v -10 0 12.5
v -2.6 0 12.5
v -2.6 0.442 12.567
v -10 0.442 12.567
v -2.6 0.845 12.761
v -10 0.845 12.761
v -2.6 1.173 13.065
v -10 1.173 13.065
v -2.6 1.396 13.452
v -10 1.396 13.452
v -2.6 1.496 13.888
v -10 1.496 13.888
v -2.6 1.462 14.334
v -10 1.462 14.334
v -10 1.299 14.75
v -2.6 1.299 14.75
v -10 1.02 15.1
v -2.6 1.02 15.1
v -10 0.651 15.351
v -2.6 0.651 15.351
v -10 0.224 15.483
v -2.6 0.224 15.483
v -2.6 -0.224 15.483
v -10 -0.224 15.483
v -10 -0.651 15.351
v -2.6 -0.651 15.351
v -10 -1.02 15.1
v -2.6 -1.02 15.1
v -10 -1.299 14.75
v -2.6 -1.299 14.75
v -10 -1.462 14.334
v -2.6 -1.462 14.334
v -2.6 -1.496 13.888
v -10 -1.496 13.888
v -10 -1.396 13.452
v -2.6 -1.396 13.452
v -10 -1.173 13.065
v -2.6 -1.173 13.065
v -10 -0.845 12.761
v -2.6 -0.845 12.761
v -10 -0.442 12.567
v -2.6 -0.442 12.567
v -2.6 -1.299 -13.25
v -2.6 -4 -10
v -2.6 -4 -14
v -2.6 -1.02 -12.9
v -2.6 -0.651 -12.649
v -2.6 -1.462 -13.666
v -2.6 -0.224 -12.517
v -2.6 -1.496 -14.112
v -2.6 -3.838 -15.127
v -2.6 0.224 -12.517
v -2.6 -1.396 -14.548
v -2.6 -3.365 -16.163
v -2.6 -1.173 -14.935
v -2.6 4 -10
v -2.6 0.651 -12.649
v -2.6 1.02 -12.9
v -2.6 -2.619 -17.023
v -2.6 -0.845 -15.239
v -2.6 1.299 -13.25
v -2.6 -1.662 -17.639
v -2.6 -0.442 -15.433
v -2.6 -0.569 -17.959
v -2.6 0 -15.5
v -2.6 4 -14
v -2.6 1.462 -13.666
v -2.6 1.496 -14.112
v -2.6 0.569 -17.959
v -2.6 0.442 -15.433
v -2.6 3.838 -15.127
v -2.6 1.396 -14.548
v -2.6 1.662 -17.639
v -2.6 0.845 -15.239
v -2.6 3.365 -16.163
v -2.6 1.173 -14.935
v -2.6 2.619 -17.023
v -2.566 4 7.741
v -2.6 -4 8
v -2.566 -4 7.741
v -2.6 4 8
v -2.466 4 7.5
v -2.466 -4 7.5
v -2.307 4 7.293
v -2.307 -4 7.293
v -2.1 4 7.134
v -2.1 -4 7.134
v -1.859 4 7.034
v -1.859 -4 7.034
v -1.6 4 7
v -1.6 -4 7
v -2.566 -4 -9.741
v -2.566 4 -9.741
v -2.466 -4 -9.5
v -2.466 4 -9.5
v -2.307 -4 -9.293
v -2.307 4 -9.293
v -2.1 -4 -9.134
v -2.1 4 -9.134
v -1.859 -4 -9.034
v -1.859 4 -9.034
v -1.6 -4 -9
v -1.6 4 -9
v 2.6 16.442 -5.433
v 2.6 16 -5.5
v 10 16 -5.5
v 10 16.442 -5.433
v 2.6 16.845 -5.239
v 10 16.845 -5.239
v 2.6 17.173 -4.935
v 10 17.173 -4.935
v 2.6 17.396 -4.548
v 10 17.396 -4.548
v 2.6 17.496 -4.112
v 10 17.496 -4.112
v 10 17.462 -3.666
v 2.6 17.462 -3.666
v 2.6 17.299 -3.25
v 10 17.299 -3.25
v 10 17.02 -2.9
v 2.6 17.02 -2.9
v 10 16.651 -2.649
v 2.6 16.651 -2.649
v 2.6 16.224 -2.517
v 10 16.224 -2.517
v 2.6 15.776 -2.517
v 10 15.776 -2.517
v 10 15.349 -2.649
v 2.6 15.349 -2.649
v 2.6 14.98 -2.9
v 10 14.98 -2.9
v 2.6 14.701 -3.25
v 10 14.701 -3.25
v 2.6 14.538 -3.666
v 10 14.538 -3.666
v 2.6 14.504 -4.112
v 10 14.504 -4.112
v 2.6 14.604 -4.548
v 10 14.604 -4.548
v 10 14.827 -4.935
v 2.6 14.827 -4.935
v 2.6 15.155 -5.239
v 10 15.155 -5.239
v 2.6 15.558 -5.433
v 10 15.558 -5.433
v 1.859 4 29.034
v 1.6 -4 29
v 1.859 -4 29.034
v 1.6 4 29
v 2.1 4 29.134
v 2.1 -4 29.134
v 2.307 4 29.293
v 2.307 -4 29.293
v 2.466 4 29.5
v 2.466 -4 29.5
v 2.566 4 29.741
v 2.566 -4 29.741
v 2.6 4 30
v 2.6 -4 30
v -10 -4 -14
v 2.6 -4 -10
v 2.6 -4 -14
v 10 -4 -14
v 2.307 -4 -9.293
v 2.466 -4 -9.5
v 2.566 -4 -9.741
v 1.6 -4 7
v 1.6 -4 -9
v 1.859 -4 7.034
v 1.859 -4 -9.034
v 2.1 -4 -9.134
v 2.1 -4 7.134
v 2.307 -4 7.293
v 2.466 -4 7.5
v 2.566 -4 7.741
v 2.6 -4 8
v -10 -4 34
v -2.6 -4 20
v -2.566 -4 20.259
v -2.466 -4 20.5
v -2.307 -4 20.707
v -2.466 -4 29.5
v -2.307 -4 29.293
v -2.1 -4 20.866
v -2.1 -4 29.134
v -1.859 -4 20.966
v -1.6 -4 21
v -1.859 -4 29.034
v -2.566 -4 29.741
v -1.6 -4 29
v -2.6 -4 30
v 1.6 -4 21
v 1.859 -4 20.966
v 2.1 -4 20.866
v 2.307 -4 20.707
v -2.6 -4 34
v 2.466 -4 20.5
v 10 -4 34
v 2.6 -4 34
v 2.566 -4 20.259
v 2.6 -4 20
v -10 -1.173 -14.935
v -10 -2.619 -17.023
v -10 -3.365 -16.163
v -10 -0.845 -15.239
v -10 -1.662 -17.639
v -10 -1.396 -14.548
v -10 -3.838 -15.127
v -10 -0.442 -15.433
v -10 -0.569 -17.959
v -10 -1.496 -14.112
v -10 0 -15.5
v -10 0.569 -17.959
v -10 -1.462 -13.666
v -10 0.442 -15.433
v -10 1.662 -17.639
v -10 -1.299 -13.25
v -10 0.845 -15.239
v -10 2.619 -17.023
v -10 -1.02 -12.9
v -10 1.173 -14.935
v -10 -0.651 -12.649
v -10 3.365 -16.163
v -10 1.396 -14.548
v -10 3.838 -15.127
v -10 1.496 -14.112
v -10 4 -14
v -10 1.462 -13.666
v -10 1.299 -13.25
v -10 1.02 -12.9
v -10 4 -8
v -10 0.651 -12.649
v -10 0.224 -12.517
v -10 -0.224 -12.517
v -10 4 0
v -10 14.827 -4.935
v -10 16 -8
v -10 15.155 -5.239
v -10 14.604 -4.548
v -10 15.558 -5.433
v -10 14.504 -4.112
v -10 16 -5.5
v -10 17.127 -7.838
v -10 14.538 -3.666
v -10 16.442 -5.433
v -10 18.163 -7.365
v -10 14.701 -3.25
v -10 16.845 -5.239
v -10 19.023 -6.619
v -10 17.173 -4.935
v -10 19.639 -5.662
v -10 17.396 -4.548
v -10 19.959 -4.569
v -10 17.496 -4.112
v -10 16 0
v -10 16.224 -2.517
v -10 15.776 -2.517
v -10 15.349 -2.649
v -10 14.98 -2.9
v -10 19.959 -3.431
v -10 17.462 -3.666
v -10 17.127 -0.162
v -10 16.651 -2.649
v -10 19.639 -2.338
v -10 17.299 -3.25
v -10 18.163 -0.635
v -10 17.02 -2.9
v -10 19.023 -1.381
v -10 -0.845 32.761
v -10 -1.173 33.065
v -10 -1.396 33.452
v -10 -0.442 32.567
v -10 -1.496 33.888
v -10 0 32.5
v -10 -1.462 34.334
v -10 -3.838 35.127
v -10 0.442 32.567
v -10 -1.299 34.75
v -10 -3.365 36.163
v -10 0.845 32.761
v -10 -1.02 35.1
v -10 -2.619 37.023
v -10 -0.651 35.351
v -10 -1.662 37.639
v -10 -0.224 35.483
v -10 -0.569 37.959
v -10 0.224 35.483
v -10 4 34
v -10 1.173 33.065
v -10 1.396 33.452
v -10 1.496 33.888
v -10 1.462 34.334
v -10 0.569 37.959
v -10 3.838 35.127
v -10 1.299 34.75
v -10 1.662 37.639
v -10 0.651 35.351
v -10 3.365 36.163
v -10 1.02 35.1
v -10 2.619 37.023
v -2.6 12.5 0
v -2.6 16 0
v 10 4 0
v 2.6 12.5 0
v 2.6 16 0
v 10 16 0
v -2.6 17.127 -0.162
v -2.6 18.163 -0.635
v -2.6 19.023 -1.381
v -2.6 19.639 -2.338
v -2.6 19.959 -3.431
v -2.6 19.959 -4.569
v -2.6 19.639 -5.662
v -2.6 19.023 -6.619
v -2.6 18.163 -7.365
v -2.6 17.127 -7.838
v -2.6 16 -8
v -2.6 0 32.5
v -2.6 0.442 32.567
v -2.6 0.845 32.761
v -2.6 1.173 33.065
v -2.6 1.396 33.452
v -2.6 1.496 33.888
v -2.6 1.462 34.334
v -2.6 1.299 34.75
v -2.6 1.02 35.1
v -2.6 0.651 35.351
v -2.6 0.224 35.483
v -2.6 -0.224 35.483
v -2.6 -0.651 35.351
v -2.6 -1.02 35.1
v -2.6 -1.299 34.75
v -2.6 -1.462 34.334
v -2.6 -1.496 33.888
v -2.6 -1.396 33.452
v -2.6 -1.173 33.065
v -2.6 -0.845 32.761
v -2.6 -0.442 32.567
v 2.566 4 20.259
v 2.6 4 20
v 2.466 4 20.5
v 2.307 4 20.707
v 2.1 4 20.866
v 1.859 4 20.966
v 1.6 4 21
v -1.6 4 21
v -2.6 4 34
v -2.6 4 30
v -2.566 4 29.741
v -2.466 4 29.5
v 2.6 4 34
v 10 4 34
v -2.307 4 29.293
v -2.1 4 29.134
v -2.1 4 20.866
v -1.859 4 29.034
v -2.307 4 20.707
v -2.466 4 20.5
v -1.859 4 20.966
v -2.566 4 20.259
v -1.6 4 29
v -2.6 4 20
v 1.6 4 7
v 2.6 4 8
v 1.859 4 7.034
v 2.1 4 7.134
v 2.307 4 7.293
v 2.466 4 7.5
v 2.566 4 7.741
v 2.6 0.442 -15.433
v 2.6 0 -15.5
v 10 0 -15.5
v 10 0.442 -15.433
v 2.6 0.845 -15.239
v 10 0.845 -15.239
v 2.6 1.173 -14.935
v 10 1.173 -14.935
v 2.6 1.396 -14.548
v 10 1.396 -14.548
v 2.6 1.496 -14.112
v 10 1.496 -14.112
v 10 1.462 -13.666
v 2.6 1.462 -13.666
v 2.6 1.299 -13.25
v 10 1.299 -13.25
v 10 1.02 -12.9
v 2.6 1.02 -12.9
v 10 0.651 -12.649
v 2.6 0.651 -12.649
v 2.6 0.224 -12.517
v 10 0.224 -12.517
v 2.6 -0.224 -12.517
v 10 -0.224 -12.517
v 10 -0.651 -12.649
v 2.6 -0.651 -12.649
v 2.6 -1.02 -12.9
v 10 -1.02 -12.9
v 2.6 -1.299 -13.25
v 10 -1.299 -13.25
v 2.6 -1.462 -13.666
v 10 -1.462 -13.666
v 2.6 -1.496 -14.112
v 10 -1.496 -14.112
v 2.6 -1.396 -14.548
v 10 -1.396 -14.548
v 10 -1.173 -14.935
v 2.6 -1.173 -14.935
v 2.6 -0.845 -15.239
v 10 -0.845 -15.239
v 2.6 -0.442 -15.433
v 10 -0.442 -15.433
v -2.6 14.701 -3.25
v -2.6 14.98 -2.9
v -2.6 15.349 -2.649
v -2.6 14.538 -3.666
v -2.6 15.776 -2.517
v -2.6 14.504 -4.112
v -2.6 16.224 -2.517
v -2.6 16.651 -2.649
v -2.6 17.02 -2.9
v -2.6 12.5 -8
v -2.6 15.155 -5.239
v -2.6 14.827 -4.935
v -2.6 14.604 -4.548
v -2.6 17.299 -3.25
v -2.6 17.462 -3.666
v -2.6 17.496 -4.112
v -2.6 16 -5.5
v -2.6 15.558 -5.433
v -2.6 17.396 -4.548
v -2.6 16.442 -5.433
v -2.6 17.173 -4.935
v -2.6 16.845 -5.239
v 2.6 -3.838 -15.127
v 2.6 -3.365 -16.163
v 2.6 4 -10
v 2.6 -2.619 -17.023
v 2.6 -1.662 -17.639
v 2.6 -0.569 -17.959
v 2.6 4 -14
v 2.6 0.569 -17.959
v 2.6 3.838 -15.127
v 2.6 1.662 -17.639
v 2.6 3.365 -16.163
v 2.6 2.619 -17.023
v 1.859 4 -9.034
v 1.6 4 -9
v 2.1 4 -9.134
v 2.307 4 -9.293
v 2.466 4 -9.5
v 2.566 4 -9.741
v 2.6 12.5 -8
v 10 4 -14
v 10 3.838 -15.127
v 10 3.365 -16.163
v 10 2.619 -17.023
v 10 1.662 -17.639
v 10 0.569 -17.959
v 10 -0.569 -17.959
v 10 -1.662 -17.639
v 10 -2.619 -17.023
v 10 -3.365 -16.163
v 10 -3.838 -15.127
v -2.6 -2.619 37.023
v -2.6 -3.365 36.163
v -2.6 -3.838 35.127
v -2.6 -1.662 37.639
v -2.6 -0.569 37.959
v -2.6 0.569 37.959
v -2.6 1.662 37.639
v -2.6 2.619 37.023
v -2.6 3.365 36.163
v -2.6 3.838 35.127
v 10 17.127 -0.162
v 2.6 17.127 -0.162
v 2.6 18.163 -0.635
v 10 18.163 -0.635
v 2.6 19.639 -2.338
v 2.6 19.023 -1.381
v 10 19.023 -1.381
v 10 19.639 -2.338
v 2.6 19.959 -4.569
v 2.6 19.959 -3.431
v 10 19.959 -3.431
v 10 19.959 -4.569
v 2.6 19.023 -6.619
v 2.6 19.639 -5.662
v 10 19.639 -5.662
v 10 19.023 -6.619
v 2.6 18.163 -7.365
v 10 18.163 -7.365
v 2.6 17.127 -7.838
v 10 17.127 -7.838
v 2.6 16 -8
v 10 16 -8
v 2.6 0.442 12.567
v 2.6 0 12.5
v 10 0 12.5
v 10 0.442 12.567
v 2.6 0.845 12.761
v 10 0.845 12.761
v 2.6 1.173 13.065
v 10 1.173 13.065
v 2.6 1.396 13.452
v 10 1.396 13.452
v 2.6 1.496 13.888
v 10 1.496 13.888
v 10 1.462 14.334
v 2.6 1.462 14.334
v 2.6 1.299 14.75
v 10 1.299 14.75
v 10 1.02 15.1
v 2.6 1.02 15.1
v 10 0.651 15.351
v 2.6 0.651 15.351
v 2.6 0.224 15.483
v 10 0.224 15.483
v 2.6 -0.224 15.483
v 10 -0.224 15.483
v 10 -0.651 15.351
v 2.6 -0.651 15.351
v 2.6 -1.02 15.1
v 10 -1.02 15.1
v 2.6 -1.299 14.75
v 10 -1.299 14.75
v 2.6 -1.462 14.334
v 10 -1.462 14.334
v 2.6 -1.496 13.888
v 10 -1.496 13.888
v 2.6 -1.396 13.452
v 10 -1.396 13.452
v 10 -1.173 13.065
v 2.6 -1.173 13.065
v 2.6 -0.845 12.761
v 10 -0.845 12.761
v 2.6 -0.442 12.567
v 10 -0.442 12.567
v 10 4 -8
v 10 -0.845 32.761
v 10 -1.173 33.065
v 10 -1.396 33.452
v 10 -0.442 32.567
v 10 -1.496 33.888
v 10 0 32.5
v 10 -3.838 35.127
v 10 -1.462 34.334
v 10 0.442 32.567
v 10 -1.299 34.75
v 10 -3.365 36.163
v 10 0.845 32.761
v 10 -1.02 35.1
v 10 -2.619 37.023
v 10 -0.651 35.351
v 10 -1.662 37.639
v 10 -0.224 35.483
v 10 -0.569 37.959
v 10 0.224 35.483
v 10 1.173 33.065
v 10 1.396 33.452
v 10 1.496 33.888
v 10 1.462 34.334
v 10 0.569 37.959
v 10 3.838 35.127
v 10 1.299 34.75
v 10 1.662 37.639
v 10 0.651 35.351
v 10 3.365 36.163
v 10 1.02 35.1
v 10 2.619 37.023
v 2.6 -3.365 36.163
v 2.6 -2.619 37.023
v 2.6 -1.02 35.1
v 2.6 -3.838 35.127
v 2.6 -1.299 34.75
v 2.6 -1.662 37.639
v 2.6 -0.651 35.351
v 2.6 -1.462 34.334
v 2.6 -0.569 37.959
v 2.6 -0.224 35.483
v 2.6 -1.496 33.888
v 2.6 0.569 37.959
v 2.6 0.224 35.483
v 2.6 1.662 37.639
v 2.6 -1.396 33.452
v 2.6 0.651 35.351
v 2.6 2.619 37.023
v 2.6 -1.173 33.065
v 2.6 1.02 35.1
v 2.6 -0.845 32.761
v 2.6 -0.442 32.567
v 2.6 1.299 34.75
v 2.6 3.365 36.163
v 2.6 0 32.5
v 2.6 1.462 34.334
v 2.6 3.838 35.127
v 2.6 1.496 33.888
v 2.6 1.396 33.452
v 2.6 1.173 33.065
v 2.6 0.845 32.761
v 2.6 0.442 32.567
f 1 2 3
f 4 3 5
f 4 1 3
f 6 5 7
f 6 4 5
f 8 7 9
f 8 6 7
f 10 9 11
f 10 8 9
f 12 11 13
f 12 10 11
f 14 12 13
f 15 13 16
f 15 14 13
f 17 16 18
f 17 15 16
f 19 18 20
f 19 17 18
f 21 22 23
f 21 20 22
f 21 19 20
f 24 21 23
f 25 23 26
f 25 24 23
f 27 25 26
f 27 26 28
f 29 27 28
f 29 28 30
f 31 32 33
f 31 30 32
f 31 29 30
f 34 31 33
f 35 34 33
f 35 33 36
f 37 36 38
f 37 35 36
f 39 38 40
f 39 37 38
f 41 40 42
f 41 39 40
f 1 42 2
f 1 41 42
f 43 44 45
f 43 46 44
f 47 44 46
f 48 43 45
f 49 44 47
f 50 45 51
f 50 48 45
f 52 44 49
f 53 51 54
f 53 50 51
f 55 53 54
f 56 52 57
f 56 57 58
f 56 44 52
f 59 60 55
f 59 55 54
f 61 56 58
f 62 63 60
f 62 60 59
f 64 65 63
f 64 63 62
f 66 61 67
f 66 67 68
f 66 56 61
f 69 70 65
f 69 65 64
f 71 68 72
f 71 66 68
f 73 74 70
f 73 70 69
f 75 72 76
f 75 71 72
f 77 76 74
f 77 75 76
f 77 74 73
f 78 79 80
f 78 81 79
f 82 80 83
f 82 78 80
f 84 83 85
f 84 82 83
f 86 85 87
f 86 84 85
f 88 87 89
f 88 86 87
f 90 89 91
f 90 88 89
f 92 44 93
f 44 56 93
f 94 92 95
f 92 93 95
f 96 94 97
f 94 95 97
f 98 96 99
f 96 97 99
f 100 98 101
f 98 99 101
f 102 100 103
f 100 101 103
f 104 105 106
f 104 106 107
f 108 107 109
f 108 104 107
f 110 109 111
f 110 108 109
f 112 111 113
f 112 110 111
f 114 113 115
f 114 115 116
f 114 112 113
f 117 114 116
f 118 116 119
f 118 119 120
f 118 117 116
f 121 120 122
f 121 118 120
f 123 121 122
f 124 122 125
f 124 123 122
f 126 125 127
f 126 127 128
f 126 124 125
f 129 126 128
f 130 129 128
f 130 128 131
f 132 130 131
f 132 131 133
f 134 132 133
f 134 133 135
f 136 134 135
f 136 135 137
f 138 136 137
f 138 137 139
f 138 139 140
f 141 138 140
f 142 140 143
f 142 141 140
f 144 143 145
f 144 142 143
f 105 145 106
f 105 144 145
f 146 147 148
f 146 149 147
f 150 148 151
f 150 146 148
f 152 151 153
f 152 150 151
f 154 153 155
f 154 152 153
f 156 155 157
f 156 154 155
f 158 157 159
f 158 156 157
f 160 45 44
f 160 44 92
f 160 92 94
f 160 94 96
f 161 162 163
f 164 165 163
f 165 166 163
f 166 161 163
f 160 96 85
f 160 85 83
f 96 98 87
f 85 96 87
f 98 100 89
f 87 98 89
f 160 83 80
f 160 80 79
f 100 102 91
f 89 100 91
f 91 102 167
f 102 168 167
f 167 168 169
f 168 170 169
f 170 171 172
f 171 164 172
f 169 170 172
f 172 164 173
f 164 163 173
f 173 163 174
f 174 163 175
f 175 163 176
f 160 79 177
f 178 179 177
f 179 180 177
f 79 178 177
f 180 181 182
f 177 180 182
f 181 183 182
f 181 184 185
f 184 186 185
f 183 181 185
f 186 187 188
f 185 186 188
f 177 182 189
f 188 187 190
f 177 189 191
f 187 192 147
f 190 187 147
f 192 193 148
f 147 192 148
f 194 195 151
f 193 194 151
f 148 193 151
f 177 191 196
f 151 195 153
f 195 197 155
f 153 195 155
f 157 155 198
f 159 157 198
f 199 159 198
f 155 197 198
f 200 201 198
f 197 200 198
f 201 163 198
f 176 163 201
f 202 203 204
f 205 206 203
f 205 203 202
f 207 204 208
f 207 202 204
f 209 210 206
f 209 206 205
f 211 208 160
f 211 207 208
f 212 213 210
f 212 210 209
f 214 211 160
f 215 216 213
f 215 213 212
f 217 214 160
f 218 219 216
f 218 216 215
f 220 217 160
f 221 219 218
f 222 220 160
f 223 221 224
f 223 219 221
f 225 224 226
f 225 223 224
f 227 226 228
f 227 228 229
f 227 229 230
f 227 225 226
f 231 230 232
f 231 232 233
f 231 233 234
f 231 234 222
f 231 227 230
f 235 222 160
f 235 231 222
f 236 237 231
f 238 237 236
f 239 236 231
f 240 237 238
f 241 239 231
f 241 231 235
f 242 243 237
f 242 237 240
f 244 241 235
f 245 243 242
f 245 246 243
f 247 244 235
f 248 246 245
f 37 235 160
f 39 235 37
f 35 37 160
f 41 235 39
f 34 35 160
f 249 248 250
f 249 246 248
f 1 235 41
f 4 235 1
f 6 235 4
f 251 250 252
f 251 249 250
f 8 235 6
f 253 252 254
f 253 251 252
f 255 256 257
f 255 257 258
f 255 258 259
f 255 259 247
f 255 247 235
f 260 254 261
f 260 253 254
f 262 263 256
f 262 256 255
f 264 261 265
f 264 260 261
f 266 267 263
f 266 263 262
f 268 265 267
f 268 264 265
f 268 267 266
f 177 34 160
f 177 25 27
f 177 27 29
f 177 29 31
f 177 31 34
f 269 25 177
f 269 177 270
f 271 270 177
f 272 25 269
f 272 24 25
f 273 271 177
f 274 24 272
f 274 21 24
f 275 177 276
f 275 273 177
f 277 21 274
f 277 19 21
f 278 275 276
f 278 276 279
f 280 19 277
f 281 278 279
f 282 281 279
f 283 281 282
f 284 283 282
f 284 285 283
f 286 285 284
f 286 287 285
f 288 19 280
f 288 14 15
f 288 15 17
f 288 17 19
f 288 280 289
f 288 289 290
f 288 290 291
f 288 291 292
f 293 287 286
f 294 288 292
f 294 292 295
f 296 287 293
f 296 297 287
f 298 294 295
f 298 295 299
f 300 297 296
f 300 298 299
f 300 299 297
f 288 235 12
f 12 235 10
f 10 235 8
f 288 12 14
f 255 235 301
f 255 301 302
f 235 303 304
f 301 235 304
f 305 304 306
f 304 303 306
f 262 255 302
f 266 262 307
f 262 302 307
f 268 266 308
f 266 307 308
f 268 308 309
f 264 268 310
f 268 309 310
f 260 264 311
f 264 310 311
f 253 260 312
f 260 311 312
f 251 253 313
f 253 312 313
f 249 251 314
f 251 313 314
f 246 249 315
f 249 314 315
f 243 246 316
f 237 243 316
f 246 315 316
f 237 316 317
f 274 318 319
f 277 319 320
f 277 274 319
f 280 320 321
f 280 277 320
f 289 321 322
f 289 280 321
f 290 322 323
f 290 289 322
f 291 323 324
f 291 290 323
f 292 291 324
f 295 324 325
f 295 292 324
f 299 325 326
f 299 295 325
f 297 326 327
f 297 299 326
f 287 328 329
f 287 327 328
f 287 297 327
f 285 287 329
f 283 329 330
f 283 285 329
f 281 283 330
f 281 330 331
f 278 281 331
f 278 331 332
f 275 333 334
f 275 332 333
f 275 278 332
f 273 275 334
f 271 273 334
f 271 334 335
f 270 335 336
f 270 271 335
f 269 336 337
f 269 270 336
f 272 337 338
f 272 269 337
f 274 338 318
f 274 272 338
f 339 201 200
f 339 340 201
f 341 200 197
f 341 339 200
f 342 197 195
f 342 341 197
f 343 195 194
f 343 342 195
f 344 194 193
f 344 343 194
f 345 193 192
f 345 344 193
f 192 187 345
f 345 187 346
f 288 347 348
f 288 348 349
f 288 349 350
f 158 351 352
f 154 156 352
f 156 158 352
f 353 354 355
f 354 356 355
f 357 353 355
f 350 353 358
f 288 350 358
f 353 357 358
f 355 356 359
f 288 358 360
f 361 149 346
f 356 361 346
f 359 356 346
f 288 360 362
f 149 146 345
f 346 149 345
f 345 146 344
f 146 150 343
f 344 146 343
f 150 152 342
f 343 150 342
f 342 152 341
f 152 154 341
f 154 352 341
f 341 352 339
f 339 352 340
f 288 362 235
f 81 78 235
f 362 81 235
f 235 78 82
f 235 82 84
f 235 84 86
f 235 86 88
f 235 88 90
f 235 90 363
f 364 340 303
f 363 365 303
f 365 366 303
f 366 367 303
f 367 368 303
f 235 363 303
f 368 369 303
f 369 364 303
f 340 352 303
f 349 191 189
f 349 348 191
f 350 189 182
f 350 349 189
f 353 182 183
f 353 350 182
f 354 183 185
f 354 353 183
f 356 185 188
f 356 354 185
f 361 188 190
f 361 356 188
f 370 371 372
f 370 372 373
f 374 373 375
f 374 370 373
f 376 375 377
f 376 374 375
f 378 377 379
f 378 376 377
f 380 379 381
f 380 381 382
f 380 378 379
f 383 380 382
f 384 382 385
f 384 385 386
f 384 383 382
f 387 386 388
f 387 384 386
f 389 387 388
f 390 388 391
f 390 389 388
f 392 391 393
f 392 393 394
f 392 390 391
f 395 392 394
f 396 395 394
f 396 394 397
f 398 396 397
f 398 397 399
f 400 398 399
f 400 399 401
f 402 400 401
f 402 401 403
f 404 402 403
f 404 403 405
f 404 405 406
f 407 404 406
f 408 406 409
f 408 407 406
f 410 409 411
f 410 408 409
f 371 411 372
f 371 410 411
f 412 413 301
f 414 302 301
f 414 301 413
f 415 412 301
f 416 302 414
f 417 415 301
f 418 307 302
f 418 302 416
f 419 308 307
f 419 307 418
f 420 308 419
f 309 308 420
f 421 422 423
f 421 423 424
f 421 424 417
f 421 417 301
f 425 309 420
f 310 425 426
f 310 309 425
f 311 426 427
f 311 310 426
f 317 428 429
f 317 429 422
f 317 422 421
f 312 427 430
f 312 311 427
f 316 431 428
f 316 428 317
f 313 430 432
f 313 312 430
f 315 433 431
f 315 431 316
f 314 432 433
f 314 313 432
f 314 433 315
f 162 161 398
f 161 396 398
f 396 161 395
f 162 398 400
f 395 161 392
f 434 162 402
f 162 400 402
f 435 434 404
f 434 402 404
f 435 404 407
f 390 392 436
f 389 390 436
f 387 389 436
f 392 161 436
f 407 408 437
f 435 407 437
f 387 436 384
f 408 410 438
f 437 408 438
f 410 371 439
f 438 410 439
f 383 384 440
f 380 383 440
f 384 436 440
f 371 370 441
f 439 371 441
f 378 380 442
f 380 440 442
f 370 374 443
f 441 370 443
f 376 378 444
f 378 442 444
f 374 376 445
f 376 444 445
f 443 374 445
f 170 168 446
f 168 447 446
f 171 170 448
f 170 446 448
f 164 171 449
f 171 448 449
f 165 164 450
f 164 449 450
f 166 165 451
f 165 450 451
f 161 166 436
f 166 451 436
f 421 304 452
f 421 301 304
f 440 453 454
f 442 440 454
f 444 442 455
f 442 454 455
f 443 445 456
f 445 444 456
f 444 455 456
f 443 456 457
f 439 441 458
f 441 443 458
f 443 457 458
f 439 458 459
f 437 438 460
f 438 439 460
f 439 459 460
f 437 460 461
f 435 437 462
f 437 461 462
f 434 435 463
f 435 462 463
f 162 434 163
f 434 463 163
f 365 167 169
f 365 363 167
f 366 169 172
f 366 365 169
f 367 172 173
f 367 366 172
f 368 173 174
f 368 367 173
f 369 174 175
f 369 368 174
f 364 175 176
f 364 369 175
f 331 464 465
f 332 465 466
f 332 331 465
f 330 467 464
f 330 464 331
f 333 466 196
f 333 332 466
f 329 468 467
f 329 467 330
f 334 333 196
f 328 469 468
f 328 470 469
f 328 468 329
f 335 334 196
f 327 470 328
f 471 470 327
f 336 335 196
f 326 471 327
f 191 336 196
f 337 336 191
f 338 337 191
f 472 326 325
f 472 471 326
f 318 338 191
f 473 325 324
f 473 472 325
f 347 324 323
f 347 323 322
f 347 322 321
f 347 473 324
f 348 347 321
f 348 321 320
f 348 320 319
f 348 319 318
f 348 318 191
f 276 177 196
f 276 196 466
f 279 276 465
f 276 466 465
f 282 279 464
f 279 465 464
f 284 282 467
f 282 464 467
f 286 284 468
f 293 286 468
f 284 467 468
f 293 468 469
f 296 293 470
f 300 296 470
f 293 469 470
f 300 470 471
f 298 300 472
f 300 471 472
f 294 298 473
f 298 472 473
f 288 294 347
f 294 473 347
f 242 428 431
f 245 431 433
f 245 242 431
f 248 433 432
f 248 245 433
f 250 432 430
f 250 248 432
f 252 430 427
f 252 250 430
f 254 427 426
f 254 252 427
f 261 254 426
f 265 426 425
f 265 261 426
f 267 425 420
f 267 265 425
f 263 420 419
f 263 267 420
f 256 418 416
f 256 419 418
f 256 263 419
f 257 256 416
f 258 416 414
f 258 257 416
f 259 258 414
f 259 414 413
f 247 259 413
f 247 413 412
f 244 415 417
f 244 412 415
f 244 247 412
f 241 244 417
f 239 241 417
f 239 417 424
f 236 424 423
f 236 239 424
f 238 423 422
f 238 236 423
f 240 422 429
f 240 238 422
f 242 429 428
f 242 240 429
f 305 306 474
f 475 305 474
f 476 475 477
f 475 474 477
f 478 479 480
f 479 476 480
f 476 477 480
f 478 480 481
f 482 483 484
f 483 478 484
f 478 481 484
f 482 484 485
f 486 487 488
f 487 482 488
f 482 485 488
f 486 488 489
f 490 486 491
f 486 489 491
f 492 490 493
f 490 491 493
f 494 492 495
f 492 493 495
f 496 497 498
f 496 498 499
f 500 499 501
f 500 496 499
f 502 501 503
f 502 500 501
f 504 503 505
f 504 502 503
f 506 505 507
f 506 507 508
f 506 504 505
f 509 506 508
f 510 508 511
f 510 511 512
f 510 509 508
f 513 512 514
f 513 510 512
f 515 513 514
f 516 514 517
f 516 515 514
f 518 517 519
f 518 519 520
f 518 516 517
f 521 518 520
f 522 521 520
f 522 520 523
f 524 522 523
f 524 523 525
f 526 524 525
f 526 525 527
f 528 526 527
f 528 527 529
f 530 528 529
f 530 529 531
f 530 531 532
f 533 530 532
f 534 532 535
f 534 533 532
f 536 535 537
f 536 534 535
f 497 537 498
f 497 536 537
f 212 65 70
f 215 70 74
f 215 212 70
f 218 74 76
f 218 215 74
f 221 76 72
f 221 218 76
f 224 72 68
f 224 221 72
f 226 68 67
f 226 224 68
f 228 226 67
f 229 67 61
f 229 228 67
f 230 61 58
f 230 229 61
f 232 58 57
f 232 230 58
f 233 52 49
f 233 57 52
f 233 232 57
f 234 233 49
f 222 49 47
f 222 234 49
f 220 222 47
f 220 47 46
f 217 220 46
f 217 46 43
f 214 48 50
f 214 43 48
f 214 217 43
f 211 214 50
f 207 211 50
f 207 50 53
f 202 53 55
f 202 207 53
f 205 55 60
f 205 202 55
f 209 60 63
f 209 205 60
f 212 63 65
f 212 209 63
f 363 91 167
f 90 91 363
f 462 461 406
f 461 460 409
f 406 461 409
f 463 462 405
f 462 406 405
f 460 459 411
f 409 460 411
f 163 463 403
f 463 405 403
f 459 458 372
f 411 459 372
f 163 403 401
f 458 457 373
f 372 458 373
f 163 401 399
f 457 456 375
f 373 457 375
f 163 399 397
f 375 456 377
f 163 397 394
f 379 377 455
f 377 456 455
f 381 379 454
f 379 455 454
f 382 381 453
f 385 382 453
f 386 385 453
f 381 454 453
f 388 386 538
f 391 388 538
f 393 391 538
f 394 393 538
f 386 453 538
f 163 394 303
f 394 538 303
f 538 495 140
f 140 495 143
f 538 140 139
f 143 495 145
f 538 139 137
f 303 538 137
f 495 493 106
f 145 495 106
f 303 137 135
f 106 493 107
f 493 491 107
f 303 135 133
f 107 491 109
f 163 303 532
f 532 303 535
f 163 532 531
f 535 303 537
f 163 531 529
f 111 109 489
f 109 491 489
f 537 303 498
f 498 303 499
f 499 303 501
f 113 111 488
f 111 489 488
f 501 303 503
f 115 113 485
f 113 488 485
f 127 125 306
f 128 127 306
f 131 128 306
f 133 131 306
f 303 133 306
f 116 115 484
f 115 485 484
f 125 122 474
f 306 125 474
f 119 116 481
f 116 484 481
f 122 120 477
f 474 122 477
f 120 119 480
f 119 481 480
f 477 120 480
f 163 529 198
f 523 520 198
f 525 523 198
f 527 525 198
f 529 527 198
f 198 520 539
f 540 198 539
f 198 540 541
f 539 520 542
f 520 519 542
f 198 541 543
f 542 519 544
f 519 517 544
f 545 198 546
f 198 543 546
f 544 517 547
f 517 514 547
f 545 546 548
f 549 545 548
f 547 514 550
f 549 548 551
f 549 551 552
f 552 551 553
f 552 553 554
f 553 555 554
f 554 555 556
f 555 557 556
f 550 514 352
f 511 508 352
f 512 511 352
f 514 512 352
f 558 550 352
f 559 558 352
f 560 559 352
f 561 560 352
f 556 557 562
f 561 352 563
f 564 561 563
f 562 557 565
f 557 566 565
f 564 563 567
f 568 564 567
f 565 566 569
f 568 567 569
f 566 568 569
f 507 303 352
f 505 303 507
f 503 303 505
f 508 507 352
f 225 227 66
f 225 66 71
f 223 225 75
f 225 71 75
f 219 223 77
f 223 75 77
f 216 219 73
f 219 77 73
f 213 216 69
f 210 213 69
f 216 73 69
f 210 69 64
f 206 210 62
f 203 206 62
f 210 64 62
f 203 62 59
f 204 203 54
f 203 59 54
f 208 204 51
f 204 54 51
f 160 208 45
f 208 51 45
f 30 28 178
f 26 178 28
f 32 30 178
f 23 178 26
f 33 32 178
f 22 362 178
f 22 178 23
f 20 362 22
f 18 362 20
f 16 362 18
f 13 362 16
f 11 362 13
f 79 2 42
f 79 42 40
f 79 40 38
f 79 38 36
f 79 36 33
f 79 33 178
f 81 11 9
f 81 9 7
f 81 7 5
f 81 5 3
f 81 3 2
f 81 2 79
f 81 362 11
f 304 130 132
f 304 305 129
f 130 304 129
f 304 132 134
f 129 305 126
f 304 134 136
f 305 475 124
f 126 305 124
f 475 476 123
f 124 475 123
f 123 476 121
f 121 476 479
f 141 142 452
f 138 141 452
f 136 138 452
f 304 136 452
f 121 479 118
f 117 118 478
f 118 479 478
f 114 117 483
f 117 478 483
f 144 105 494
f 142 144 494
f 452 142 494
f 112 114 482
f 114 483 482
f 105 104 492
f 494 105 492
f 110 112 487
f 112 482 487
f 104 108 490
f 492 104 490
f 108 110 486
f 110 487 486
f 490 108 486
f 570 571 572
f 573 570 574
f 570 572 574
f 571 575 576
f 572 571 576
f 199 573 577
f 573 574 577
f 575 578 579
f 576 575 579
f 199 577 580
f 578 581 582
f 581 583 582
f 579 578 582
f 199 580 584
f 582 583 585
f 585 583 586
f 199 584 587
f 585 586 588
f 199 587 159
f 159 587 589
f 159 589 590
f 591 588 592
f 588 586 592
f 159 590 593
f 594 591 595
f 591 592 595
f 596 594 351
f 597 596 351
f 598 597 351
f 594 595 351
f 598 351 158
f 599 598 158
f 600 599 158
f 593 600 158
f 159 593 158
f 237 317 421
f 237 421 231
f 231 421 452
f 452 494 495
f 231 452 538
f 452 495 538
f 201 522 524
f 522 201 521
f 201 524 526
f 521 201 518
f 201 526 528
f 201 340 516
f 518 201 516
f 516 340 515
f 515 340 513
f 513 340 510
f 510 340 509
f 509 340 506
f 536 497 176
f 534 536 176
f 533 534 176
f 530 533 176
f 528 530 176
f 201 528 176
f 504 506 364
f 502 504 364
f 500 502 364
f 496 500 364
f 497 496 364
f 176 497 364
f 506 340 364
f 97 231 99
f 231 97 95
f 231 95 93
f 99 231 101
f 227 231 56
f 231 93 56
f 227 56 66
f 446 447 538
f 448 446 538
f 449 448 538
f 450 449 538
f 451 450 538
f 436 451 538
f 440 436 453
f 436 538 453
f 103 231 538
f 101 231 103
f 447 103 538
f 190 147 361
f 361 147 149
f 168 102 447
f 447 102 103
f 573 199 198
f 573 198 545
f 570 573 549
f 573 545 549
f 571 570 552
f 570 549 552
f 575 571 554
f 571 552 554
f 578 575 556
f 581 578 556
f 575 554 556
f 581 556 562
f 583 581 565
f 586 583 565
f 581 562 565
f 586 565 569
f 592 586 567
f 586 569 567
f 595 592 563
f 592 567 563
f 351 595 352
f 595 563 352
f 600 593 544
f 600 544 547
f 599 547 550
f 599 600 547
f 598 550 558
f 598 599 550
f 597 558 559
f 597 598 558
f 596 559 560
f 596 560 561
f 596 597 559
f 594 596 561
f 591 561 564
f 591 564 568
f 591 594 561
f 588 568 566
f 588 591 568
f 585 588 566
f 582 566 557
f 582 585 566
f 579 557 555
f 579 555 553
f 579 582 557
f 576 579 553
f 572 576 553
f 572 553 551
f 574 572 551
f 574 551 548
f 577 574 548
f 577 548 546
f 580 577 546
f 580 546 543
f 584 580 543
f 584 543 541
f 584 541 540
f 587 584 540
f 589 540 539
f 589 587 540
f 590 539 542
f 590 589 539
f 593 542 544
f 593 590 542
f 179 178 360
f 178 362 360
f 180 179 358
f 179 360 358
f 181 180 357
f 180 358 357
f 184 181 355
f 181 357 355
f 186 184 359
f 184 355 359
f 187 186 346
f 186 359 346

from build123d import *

# Parameters (mm, degrees)
CROQUIS1_R              = 1.5
SALIENTE_EXTRUIR1_DEPTH = 10
CROQUIS2_W              = 8
CROQUIS2_H              = 7.5
CROQUIS2_W_2            = 14
CROQUIS2_H_2            = 8
CROQUIS2_W_3            = 9
CORTAR_EXTRUIR1_DEPTH   = 2.6
REDONDEO1_R             = 1


with BuildPart() as part:
    # Croquis1 → Saliente-Extruir1 (new, symmetric)
    with BuildSketch(Plane(origin=(0, 0, 0), x_dir=(0, 0, -1), z_dir=(1, 0, 0))):
        with BuildLine():
            Line((-14, 4), (0, 4))
            Line((0, 4), (0, 16))
            ThreePointArc((0, 16), (4, 20), (8, 16))
            Line((8, 16), (8, 4))
            Line((8, 4), (14, 4))
            ThreePointArc((14, 4), (18, 0), (14, -4))
            Line((14, -4), (-14, -4))
            Line((-14, -4), (-34, -4))
            ThreePointArc((-34, -4), (-38, 0), (-34, 4))
            Line((-34, 4), (-14, 4))
        make_face()
        with Locations((14, 0)):
            Circle(CROQUIS1_R, mode=Mode.SUBTRACT)
        with Locations((4, 16)):
            Circle(CROQUIS1_R, mode=Mode.SUBTRACT)
        with Locations((-14, 0)):
            Circle(CROQUIS1_R, mode=Mode.SUBTRACT)
        with Locations((-34, 0)):
            Circle(CROQUIS1_R, mode=Mode.SUBTRACT)
    extrude(amount=SALIENTE_EXTRUIR1_DEPTH, both=True)

    # Croquis2 → Cortar-Extruir1 (cut, symmetric)
    with BuildSketch(Plane(origin=(0, 0, 0), x_dir=(0, 0, -1), z_dir=(1, 0, 0))):
        with Locations((4, 16.25)):
            Rectangle(CROQUIS2_W, CROQUIS2_H)
        with Locations((-14, 0)):
            Rectangle(CROQUIS2_W_2, CROQUIS2_H_2)
        with Locations((13.5, 0)):
            Rectangle(CROQUIS2_W_3, CROQUIS2_H_2)
        with Locations((-33.5, 0)):
            Rectangle(CROQUIS2_W_3, CROQUIS2_H_2)
    extrude(amount=CORTAR_EXTRUIR1_DEPTH, both=True, mode=Mode.SUBTRACT)

    # Redondeo1
    redondeo1_edges = [part.edges().sort_by_distance(p)[0] for p in [
        (2.6, 0, -9),
        (-2.6, 0, -9),
        (-2.6, 0, 7),
        (-2.6, 0, 21),
        (2.6, 0, 7),
        (2.6, 0, 21),
        (2.6, 0, 29),
        (-2.6, 0, 29),
    ]]
    fillet(redondeo1_edges, radius=REDONDEO1_R)


solid = part.part
